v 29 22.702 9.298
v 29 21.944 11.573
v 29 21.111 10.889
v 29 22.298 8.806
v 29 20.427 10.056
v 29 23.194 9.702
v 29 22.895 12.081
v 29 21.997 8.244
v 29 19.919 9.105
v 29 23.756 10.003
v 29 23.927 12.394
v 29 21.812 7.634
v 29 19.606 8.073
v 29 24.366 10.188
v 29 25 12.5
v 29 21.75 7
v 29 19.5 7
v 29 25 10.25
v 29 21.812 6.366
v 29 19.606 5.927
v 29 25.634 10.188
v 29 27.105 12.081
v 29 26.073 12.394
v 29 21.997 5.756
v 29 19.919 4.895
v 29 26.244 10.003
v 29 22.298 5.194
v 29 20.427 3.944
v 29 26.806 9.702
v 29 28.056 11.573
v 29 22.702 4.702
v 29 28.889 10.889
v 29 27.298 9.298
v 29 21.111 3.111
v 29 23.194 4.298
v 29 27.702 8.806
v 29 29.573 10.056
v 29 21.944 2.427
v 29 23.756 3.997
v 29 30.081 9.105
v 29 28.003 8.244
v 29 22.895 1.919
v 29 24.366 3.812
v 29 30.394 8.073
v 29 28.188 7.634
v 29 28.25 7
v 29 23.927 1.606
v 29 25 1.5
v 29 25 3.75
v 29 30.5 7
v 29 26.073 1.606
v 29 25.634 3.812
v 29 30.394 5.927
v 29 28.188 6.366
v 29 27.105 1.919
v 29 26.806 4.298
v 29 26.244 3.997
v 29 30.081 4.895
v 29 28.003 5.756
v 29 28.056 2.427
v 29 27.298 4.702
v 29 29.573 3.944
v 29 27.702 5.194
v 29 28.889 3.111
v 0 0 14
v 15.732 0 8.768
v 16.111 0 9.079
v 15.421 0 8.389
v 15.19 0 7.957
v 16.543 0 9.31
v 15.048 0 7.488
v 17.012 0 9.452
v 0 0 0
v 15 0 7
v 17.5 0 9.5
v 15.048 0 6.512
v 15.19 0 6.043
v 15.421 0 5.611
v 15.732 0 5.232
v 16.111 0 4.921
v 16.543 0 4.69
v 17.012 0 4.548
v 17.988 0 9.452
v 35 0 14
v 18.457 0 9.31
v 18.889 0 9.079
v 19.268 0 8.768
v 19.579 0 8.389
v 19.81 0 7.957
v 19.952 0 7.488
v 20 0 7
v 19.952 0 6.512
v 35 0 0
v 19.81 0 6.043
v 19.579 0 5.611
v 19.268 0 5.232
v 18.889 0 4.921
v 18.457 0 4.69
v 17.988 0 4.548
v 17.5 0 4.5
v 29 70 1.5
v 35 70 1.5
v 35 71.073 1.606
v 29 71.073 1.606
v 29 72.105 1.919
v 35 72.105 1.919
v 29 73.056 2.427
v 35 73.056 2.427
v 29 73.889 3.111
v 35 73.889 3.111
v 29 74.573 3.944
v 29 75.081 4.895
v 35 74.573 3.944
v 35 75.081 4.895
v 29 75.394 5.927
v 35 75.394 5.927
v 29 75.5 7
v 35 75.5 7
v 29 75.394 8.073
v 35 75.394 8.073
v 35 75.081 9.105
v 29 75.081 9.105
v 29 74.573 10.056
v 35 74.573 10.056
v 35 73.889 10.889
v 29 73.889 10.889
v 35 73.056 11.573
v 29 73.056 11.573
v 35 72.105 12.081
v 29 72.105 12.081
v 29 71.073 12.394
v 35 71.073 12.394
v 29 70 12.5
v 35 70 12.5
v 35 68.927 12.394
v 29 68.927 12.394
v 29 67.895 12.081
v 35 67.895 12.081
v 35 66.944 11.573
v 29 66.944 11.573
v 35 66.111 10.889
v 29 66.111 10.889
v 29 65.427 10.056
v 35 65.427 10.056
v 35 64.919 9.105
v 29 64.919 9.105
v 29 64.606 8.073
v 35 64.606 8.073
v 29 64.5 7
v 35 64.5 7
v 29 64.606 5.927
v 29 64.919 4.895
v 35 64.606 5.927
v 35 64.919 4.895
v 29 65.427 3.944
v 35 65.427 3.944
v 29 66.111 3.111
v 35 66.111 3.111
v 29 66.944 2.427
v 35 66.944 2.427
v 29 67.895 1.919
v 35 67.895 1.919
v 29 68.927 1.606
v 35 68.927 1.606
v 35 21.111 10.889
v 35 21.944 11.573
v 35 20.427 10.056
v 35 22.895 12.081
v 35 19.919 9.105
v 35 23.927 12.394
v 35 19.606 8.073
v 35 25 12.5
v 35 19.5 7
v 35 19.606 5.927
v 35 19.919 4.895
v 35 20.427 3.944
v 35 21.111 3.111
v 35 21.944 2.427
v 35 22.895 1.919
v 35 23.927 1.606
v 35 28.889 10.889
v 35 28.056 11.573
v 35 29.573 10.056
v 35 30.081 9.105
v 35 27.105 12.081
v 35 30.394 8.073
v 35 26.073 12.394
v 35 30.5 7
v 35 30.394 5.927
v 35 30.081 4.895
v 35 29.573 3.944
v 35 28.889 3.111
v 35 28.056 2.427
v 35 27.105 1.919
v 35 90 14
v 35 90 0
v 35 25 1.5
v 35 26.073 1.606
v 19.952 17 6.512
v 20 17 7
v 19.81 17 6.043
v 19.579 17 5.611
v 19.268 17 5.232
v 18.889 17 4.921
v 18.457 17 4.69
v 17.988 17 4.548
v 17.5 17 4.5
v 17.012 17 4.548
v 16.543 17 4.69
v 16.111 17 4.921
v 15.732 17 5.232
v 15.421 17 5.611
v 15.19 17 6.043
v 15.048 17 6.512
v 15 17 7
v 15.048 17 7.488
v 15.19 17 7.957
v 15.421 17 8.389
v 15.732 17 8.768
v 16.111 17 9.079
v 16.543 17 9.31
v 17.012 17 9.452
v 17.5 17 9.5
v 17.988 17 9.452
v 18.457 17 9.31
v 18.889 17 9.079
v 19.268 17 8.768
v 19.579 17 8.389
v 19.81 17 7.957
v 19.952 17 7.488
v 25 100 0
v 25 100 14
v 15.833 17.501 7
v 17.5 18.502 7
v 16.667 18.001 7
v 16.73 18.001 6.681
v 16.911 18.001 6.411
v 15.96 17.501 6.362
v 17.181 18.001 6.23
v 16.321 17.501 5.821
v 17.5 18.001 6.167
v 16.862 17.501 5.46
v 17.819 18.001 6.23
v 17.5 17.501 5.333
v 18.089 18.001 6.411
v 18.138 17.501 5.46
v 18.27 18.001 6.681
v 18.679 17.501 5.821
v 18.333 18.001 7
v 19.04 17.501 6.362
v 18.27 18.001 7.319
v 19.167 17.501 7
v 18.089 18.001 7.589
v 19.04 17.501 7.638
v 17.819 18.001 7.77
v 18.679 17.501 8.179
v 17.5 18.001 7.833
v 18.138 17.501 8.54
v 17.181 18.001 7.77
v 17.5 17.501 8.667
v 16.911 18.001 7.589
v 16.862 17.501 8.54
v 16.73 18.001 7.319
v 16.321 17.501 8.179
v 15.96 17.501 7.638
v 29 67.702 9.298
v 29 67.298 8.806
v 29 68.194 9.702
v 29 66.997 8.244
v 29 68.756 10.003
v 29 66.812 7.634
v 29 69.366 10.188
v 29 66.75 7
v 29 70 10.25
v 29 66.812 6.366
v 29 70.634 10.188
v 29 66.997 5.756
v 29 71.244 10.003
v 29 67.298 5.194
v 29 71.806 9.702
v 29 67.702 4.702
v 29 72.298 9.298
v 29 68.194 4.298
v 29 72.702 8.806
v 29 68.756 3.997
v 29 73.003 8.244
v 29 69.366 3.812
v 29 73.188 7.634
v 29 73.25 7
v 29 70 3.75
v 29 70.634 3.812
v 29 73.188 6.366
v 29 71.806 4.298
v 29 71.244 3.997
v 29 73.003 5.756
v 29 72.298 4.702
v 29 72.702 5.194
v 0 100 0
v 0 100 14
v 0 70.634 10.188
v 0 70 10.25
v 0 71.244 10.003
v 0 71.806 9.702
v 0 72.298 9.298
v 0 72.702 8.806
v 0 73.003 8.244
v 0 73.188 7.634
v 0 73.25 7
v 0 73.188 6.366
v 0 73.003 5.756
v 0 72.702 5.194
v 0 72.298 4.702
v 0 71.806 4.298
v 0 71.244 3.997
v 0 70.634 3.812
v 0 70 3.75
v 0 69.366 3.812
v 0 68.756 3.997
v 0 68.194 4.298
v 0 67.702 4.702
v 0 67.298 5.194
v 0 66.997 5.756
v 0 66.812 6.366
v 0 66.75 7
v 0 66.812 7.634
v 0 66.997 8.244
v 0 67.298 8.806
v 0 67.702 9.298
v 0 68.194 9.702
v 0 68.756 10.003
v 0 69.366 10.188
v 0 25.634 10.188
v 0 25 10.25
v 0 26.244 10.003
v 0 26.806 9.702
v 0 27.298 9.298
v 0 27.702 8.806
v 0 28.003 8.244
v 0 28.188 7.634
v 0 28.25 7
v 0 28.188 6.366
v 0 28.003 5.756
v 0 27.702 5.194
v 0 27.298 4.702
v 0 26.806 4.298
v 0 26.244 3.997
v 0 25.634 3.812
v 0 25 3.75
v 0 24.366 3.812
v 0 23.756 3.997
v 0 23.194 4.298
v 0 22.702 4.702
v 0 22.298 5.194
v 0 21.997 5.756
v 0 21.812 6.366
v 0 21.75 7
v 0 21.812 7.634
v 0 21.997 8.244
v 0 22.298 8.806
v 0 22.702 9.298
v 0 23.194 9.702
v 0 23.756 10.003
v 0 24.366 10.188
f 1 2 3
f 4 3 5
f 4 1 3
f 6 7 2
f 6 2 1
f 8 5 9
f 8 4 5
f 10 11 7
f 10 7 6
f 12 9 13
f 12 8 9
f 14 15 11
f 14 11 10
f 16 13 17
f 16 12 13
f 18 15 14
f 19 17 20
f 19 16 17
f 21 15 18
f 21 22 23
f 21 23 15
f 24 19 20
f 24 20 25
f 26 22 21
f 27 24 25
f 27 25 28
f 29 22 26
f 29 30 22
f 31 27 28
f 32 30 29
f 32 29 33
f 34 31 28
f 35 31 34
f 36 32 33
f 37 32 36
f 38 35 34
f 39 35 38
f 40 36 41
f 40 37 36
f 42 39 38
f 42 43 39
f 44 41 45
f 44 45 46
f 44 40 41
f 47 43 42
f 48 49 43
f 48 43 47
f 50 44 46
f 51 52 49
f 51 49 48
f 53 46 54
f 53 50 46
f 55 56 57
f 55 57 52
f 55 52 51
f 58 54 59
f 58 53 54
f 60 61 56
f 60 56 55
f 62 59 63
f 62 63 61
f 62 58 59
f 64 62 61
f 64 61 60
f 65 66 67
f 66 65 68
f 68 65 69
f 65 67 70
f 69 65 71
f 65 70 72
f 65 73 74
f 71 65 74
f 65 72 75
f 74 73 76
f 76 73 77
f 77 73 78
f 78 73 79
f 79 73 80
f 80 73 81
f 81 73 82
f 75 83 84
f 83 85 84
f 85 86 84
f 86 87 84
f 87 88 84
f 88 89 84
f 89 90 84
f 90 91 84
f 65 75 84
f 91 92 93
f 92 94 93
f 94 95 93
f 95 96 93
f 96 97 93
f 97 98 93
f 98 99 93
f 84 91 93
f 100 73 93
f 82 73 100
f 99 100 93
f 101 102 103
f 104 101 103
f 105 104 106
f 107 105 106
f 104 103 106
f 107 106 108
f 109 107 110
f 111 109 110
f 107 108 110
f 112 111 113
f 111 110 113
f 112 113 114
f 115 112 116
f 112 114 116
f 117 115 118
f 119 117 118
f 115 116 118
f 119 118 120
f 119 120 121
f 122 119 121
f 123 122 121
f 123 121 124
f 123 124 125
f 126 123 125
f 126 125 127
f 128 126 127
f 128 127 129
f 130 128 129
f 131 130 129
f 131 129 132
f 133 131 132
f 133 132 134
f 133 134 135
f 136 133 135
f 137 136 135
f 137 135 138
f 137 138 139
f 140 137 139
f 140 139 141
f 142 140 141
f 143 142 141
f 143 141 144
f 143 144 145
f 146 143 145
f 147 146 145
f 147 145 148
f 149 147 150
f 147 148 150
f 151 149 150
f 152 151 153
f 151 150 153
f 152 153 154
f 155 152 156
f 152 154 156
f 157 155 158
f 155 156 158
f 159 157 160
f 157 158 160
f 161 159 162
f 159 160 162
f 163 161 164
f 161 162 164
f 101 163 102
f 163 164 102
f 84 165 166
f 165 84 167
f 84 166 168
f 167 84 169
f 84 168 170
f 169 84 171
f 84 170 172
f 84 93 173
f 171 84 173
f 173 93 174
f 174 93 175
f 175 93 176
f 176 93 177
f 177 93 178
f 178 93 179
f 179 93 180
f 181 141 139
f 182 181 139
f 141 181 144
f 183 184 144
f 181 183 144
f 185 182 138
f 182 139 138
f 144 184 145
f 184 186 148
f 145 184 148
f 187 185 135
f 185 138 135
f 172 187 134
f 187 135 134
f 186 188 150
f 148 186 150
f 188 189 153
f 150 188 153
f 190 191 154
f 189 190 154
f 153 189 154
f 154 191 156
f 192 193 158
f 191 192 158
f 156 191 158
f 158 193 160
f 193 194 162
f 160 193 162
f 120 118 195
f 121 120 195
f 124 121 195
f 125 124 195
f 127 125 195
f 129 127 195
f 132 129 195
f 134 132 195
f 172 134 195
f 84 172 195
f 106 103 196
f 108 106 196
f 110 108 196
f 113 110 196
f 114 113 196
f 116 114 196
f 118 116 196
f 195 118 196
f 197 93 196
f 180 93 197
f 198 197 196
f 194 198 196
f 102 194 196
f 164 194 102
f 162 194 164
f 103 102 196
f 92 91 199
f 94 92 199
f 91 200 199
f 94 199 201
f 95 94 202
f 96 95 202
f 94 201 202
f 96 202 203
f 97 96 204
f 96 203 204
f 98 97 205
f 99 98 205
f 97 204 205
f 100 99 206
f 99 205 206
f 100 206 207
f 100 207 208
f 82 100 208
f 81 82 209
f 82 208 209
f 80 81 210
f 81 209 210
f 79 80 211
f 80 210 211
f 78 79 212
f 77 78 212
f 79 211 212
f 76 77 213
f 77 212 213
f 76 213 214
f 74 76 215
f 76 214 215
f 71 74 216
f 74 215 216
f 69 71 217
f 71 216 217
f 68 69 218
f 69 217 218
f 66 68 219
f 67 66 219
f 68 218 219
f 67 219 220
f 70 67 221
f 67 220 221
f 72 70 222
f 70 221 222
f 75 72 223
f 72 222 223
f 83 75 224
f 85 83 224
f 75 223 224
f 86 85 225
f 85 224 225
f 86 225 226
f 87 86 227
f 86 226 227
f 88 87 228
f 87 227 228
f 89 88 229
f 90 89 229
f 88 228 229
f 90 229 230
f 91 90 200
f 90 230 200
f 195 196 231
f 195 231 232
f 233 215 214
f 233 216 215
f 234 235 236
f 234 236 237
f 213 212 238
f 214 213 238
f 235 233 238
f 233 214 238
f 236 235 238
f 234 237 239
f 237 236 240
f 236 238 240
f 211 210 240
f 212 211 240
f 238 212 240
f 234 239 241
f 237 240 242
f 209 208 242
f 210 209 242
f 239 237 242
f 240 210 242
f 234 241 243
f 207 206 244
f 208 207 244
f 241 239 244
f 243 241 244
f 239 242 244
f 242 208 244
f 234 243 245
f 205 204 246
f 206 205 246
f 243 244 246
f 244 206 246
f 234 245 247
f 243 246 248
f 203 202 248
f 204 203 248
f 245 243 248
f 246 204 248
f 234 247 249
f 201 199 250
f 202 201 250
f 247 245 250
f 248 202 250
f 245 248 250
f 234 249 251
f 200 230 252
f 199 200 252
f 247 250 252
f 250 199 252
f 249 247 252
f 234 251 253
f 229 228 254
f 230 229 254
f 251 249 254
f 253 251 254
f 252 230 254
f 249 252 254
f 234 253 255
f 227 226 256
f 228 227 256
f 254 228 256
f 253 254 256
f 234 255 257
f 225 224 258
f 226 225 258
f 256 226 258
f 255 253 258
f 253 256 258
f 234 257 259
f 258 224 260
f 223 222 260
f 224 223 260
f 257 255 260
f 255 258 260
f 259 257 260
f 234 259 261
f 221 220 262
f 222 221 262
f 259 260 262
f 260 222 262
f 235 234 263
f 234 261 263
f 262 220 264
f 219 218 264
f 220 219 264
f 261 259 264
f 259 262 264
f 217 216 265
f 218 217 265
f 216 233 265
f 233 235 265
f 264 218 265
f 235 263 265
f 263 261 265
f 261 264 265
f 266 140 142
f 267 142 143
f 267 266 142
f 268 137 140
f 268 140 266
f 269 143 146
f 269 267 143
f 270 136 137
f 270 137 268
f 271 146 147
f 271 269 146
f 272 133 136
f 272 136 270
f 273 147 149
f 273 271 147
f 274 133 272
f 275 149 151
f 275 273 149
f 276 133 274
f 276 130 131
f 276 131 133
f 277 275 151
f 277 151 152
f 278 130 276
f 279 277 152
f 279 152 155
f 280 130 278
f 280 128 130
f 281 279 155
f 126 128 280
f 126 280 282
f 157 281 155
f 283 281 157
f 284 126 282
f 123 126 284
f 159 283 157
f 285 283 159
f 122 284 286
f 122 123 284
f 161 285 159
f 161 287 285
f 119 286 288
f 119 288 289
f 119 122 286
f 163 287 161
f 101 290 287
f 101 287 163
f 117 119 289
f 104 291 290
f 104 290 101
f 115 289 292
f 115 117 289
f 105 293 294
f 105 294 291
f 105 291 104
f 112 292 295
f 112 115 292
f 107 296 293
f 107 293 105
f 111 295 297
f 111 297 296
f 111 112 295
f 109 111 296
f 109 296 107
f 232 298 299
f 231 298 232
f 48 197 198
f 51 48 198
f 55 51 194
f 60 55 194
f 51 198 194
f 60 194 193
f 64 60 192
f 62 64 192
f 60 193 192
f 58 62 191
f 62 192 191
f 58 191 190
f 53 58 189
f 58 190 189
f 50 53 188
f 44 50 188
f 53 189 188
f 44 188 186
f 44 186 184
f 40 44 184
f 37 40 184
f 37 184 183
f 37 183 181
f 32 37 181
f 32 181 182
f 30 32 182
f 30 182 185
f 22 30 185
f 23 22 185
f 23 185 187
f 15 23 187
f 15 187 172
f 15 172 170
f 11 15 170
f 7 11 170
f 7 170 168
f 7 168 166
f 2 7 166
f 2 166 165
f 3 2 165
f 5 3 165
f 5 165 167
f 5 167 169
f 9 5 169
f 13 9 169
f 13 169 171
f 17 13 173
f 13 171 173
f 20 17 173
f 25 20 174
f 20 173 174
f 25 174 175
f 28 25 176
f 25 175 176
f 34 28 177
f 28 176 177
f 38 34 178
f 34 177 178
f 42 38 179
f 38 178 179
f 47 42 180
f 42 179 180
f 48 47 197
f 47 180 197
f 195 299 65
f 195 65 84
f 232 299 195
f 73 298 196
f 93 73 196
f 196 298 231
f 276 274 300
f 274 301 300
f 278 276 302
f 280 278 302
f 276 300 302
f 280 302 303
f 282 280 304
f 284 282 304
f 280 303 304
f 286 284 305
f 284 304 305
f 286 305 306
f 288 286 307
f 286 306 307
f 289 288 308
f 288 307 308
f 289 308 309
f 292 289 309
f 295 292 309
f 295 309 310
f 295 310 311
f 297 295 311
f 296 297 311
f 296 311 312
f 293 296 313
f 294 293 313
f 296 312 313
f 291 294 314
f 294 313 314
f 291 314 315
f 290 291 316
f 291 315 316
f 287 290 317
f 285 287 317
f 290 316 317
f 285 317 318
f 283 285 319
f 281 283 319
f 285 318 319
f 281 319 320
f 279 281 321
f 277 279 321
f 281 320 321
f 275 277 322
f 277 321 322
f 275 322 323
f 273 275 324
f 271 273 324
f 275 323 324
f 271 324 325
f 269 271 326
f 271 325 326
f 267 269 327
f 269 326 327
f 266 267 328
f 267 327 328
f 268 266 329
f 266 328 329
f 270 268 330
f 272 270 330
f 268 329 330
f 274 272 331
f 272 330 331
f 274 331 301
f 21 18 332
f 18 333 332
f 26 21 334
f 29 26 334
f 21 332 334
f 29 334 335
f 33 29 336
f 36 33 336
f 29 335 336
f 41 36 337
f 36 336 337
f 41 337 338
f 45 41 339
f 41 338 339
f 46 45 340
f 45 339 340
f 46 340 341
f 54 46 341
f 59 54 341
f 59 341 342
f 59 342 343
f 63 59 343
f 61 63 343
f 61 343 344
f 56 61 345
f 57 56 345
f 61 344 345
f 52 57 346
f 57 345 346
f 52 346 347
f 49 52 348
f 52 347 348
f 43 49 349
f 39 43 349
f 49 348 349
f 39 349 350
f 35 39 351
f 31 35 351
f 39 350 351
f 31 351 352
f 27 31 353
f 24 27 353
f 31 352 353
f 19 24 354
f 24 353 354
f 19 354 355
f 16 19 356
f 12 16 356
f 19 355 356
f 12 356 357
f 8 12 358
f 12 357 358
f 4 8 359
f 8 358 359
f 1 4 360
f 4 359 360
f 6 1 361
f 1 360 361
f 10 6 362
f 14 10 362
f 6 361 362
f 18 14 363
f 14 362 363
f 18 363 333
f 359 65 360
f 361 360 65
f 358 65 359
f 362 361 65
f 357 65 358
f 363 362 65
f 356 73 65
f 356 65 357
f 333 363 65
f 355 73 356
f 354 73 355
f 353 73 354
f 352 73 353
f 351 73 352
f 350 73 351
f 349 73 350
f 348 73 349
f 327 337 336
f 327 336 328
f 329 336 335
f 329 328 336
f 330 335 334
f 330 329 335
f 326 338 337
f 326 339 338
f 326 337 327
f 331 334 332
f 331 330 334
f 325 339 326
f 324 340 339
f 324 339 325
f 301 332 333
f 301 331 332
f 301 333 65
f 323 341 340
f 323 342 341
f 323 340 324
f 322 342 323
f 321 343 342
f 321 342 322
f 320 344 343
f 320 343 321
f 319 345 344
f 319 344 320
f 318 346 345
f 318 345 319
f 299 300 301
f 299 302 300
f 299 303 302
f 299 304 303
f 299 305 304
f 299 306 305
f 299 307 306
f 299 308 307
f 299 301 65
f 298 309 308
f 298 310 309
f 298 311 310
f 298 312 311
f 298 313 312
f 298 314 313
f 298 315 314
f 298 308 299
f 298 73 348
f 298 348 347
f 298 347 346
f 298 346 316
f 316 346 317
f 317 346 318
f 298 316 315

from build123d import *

# Parameters (mm, degrees)
SZKIC1_W                                             = 35
SZKIC1_H                                             = 100
DODANIE_WYCI_GNI_CIE1_DEPTH                          = 14
SFAZOWANIE1_SIZE                                     = 10
POG_BIENIE_WALCOWE_POD_M6_WKR_T_DO_CZ_CI_D           = 6.5
POG_BIENIE_WALCOWE_POD_M6_WKR_T_DO_CZ_CI_CBORE_D     = 11
POG_BIENIE_WALCOWE_POD_M6_WKR_T_DO_CZ_CI_CBORE_DEPTH = 6
OTW_R_GWINTOWANY_M6X1_01_D                           = 5
OTW_R_GWINTOWANY_M6X1_01_DEPTH                       = 17
OTW_R_GWINTOWANY_M6X1_01_TIP                         = 1.502151548


with BuildPart() as part:
    # Szkic1 → Dodanie-wyciągnięcie1 (new body)
    with BuildSketch(Plane.XY):
        with Locations((17.5, 50)):
            Rectangle(SZKIC1_W, SZKIC1_H)
    extrude(amount=DODANIE_WYCI_GNI_CIE1_DEPTH)

    # Sfazowanie1
    sfazowanie1_edges = [part.edges().sort_by_distance(p)[0] for p in [
        (35, 100, 7),
    ]]
    chamfer(sfazowanie1_edges, length=SFAZOWANIE1_SIZE)

    # Pogłębienie walcowe pod M6 Wkręt do części metalowych z łbem sześciokątnym1 (through all)
    with Locations(Plane(origin=(35, 0, 0), x_dir=(0, 0, -1), z_dir=(1, 0, 0))):
        with Locations((-7, 70), (-7, 25)):
            CounterBoreHole(POG_BIENIE_WALCOWE_POD_M6_WKR_T_DO_CZ_CI_D / 2, POG_BIENIE_WALCOWE_POD_M6_WKR_T_DO_CZ_CI_CBORE_D / 2, POG_BIENIE_WALCOWE_POD_M6_WKR_T_DO_CZ_CI_CBORE_DEPTH)

    # Otwór gwintowany M6x1.01
    with Locations(Plane(origin=(0, 0, 0), x_dir=(-1, 0, 0), z_dir=(0, -1, 0))):
        with Locations((-17.5, -7)):
            Hole(OTW_R_GWINTOWANY_M6X1_01_D / 2, depth=OTW_R_GWINTOWANY_M6X1_01_DEPTH)
            with Locations((0, 0, -(OTW_R_GWINTOWANY_M6X1_01_DEPTH + OTW_R_GWINTOWANY_M6X1_01_TIP / 2))):  # 118° drill point
                Cone(0, OTW_R_GWINTOWANY_M6X1_01_D / 2, OTW_R_GWINTOWANY_M6X1_01_TIP, mode=Mode.SUBTRACT)


solid = part.part
